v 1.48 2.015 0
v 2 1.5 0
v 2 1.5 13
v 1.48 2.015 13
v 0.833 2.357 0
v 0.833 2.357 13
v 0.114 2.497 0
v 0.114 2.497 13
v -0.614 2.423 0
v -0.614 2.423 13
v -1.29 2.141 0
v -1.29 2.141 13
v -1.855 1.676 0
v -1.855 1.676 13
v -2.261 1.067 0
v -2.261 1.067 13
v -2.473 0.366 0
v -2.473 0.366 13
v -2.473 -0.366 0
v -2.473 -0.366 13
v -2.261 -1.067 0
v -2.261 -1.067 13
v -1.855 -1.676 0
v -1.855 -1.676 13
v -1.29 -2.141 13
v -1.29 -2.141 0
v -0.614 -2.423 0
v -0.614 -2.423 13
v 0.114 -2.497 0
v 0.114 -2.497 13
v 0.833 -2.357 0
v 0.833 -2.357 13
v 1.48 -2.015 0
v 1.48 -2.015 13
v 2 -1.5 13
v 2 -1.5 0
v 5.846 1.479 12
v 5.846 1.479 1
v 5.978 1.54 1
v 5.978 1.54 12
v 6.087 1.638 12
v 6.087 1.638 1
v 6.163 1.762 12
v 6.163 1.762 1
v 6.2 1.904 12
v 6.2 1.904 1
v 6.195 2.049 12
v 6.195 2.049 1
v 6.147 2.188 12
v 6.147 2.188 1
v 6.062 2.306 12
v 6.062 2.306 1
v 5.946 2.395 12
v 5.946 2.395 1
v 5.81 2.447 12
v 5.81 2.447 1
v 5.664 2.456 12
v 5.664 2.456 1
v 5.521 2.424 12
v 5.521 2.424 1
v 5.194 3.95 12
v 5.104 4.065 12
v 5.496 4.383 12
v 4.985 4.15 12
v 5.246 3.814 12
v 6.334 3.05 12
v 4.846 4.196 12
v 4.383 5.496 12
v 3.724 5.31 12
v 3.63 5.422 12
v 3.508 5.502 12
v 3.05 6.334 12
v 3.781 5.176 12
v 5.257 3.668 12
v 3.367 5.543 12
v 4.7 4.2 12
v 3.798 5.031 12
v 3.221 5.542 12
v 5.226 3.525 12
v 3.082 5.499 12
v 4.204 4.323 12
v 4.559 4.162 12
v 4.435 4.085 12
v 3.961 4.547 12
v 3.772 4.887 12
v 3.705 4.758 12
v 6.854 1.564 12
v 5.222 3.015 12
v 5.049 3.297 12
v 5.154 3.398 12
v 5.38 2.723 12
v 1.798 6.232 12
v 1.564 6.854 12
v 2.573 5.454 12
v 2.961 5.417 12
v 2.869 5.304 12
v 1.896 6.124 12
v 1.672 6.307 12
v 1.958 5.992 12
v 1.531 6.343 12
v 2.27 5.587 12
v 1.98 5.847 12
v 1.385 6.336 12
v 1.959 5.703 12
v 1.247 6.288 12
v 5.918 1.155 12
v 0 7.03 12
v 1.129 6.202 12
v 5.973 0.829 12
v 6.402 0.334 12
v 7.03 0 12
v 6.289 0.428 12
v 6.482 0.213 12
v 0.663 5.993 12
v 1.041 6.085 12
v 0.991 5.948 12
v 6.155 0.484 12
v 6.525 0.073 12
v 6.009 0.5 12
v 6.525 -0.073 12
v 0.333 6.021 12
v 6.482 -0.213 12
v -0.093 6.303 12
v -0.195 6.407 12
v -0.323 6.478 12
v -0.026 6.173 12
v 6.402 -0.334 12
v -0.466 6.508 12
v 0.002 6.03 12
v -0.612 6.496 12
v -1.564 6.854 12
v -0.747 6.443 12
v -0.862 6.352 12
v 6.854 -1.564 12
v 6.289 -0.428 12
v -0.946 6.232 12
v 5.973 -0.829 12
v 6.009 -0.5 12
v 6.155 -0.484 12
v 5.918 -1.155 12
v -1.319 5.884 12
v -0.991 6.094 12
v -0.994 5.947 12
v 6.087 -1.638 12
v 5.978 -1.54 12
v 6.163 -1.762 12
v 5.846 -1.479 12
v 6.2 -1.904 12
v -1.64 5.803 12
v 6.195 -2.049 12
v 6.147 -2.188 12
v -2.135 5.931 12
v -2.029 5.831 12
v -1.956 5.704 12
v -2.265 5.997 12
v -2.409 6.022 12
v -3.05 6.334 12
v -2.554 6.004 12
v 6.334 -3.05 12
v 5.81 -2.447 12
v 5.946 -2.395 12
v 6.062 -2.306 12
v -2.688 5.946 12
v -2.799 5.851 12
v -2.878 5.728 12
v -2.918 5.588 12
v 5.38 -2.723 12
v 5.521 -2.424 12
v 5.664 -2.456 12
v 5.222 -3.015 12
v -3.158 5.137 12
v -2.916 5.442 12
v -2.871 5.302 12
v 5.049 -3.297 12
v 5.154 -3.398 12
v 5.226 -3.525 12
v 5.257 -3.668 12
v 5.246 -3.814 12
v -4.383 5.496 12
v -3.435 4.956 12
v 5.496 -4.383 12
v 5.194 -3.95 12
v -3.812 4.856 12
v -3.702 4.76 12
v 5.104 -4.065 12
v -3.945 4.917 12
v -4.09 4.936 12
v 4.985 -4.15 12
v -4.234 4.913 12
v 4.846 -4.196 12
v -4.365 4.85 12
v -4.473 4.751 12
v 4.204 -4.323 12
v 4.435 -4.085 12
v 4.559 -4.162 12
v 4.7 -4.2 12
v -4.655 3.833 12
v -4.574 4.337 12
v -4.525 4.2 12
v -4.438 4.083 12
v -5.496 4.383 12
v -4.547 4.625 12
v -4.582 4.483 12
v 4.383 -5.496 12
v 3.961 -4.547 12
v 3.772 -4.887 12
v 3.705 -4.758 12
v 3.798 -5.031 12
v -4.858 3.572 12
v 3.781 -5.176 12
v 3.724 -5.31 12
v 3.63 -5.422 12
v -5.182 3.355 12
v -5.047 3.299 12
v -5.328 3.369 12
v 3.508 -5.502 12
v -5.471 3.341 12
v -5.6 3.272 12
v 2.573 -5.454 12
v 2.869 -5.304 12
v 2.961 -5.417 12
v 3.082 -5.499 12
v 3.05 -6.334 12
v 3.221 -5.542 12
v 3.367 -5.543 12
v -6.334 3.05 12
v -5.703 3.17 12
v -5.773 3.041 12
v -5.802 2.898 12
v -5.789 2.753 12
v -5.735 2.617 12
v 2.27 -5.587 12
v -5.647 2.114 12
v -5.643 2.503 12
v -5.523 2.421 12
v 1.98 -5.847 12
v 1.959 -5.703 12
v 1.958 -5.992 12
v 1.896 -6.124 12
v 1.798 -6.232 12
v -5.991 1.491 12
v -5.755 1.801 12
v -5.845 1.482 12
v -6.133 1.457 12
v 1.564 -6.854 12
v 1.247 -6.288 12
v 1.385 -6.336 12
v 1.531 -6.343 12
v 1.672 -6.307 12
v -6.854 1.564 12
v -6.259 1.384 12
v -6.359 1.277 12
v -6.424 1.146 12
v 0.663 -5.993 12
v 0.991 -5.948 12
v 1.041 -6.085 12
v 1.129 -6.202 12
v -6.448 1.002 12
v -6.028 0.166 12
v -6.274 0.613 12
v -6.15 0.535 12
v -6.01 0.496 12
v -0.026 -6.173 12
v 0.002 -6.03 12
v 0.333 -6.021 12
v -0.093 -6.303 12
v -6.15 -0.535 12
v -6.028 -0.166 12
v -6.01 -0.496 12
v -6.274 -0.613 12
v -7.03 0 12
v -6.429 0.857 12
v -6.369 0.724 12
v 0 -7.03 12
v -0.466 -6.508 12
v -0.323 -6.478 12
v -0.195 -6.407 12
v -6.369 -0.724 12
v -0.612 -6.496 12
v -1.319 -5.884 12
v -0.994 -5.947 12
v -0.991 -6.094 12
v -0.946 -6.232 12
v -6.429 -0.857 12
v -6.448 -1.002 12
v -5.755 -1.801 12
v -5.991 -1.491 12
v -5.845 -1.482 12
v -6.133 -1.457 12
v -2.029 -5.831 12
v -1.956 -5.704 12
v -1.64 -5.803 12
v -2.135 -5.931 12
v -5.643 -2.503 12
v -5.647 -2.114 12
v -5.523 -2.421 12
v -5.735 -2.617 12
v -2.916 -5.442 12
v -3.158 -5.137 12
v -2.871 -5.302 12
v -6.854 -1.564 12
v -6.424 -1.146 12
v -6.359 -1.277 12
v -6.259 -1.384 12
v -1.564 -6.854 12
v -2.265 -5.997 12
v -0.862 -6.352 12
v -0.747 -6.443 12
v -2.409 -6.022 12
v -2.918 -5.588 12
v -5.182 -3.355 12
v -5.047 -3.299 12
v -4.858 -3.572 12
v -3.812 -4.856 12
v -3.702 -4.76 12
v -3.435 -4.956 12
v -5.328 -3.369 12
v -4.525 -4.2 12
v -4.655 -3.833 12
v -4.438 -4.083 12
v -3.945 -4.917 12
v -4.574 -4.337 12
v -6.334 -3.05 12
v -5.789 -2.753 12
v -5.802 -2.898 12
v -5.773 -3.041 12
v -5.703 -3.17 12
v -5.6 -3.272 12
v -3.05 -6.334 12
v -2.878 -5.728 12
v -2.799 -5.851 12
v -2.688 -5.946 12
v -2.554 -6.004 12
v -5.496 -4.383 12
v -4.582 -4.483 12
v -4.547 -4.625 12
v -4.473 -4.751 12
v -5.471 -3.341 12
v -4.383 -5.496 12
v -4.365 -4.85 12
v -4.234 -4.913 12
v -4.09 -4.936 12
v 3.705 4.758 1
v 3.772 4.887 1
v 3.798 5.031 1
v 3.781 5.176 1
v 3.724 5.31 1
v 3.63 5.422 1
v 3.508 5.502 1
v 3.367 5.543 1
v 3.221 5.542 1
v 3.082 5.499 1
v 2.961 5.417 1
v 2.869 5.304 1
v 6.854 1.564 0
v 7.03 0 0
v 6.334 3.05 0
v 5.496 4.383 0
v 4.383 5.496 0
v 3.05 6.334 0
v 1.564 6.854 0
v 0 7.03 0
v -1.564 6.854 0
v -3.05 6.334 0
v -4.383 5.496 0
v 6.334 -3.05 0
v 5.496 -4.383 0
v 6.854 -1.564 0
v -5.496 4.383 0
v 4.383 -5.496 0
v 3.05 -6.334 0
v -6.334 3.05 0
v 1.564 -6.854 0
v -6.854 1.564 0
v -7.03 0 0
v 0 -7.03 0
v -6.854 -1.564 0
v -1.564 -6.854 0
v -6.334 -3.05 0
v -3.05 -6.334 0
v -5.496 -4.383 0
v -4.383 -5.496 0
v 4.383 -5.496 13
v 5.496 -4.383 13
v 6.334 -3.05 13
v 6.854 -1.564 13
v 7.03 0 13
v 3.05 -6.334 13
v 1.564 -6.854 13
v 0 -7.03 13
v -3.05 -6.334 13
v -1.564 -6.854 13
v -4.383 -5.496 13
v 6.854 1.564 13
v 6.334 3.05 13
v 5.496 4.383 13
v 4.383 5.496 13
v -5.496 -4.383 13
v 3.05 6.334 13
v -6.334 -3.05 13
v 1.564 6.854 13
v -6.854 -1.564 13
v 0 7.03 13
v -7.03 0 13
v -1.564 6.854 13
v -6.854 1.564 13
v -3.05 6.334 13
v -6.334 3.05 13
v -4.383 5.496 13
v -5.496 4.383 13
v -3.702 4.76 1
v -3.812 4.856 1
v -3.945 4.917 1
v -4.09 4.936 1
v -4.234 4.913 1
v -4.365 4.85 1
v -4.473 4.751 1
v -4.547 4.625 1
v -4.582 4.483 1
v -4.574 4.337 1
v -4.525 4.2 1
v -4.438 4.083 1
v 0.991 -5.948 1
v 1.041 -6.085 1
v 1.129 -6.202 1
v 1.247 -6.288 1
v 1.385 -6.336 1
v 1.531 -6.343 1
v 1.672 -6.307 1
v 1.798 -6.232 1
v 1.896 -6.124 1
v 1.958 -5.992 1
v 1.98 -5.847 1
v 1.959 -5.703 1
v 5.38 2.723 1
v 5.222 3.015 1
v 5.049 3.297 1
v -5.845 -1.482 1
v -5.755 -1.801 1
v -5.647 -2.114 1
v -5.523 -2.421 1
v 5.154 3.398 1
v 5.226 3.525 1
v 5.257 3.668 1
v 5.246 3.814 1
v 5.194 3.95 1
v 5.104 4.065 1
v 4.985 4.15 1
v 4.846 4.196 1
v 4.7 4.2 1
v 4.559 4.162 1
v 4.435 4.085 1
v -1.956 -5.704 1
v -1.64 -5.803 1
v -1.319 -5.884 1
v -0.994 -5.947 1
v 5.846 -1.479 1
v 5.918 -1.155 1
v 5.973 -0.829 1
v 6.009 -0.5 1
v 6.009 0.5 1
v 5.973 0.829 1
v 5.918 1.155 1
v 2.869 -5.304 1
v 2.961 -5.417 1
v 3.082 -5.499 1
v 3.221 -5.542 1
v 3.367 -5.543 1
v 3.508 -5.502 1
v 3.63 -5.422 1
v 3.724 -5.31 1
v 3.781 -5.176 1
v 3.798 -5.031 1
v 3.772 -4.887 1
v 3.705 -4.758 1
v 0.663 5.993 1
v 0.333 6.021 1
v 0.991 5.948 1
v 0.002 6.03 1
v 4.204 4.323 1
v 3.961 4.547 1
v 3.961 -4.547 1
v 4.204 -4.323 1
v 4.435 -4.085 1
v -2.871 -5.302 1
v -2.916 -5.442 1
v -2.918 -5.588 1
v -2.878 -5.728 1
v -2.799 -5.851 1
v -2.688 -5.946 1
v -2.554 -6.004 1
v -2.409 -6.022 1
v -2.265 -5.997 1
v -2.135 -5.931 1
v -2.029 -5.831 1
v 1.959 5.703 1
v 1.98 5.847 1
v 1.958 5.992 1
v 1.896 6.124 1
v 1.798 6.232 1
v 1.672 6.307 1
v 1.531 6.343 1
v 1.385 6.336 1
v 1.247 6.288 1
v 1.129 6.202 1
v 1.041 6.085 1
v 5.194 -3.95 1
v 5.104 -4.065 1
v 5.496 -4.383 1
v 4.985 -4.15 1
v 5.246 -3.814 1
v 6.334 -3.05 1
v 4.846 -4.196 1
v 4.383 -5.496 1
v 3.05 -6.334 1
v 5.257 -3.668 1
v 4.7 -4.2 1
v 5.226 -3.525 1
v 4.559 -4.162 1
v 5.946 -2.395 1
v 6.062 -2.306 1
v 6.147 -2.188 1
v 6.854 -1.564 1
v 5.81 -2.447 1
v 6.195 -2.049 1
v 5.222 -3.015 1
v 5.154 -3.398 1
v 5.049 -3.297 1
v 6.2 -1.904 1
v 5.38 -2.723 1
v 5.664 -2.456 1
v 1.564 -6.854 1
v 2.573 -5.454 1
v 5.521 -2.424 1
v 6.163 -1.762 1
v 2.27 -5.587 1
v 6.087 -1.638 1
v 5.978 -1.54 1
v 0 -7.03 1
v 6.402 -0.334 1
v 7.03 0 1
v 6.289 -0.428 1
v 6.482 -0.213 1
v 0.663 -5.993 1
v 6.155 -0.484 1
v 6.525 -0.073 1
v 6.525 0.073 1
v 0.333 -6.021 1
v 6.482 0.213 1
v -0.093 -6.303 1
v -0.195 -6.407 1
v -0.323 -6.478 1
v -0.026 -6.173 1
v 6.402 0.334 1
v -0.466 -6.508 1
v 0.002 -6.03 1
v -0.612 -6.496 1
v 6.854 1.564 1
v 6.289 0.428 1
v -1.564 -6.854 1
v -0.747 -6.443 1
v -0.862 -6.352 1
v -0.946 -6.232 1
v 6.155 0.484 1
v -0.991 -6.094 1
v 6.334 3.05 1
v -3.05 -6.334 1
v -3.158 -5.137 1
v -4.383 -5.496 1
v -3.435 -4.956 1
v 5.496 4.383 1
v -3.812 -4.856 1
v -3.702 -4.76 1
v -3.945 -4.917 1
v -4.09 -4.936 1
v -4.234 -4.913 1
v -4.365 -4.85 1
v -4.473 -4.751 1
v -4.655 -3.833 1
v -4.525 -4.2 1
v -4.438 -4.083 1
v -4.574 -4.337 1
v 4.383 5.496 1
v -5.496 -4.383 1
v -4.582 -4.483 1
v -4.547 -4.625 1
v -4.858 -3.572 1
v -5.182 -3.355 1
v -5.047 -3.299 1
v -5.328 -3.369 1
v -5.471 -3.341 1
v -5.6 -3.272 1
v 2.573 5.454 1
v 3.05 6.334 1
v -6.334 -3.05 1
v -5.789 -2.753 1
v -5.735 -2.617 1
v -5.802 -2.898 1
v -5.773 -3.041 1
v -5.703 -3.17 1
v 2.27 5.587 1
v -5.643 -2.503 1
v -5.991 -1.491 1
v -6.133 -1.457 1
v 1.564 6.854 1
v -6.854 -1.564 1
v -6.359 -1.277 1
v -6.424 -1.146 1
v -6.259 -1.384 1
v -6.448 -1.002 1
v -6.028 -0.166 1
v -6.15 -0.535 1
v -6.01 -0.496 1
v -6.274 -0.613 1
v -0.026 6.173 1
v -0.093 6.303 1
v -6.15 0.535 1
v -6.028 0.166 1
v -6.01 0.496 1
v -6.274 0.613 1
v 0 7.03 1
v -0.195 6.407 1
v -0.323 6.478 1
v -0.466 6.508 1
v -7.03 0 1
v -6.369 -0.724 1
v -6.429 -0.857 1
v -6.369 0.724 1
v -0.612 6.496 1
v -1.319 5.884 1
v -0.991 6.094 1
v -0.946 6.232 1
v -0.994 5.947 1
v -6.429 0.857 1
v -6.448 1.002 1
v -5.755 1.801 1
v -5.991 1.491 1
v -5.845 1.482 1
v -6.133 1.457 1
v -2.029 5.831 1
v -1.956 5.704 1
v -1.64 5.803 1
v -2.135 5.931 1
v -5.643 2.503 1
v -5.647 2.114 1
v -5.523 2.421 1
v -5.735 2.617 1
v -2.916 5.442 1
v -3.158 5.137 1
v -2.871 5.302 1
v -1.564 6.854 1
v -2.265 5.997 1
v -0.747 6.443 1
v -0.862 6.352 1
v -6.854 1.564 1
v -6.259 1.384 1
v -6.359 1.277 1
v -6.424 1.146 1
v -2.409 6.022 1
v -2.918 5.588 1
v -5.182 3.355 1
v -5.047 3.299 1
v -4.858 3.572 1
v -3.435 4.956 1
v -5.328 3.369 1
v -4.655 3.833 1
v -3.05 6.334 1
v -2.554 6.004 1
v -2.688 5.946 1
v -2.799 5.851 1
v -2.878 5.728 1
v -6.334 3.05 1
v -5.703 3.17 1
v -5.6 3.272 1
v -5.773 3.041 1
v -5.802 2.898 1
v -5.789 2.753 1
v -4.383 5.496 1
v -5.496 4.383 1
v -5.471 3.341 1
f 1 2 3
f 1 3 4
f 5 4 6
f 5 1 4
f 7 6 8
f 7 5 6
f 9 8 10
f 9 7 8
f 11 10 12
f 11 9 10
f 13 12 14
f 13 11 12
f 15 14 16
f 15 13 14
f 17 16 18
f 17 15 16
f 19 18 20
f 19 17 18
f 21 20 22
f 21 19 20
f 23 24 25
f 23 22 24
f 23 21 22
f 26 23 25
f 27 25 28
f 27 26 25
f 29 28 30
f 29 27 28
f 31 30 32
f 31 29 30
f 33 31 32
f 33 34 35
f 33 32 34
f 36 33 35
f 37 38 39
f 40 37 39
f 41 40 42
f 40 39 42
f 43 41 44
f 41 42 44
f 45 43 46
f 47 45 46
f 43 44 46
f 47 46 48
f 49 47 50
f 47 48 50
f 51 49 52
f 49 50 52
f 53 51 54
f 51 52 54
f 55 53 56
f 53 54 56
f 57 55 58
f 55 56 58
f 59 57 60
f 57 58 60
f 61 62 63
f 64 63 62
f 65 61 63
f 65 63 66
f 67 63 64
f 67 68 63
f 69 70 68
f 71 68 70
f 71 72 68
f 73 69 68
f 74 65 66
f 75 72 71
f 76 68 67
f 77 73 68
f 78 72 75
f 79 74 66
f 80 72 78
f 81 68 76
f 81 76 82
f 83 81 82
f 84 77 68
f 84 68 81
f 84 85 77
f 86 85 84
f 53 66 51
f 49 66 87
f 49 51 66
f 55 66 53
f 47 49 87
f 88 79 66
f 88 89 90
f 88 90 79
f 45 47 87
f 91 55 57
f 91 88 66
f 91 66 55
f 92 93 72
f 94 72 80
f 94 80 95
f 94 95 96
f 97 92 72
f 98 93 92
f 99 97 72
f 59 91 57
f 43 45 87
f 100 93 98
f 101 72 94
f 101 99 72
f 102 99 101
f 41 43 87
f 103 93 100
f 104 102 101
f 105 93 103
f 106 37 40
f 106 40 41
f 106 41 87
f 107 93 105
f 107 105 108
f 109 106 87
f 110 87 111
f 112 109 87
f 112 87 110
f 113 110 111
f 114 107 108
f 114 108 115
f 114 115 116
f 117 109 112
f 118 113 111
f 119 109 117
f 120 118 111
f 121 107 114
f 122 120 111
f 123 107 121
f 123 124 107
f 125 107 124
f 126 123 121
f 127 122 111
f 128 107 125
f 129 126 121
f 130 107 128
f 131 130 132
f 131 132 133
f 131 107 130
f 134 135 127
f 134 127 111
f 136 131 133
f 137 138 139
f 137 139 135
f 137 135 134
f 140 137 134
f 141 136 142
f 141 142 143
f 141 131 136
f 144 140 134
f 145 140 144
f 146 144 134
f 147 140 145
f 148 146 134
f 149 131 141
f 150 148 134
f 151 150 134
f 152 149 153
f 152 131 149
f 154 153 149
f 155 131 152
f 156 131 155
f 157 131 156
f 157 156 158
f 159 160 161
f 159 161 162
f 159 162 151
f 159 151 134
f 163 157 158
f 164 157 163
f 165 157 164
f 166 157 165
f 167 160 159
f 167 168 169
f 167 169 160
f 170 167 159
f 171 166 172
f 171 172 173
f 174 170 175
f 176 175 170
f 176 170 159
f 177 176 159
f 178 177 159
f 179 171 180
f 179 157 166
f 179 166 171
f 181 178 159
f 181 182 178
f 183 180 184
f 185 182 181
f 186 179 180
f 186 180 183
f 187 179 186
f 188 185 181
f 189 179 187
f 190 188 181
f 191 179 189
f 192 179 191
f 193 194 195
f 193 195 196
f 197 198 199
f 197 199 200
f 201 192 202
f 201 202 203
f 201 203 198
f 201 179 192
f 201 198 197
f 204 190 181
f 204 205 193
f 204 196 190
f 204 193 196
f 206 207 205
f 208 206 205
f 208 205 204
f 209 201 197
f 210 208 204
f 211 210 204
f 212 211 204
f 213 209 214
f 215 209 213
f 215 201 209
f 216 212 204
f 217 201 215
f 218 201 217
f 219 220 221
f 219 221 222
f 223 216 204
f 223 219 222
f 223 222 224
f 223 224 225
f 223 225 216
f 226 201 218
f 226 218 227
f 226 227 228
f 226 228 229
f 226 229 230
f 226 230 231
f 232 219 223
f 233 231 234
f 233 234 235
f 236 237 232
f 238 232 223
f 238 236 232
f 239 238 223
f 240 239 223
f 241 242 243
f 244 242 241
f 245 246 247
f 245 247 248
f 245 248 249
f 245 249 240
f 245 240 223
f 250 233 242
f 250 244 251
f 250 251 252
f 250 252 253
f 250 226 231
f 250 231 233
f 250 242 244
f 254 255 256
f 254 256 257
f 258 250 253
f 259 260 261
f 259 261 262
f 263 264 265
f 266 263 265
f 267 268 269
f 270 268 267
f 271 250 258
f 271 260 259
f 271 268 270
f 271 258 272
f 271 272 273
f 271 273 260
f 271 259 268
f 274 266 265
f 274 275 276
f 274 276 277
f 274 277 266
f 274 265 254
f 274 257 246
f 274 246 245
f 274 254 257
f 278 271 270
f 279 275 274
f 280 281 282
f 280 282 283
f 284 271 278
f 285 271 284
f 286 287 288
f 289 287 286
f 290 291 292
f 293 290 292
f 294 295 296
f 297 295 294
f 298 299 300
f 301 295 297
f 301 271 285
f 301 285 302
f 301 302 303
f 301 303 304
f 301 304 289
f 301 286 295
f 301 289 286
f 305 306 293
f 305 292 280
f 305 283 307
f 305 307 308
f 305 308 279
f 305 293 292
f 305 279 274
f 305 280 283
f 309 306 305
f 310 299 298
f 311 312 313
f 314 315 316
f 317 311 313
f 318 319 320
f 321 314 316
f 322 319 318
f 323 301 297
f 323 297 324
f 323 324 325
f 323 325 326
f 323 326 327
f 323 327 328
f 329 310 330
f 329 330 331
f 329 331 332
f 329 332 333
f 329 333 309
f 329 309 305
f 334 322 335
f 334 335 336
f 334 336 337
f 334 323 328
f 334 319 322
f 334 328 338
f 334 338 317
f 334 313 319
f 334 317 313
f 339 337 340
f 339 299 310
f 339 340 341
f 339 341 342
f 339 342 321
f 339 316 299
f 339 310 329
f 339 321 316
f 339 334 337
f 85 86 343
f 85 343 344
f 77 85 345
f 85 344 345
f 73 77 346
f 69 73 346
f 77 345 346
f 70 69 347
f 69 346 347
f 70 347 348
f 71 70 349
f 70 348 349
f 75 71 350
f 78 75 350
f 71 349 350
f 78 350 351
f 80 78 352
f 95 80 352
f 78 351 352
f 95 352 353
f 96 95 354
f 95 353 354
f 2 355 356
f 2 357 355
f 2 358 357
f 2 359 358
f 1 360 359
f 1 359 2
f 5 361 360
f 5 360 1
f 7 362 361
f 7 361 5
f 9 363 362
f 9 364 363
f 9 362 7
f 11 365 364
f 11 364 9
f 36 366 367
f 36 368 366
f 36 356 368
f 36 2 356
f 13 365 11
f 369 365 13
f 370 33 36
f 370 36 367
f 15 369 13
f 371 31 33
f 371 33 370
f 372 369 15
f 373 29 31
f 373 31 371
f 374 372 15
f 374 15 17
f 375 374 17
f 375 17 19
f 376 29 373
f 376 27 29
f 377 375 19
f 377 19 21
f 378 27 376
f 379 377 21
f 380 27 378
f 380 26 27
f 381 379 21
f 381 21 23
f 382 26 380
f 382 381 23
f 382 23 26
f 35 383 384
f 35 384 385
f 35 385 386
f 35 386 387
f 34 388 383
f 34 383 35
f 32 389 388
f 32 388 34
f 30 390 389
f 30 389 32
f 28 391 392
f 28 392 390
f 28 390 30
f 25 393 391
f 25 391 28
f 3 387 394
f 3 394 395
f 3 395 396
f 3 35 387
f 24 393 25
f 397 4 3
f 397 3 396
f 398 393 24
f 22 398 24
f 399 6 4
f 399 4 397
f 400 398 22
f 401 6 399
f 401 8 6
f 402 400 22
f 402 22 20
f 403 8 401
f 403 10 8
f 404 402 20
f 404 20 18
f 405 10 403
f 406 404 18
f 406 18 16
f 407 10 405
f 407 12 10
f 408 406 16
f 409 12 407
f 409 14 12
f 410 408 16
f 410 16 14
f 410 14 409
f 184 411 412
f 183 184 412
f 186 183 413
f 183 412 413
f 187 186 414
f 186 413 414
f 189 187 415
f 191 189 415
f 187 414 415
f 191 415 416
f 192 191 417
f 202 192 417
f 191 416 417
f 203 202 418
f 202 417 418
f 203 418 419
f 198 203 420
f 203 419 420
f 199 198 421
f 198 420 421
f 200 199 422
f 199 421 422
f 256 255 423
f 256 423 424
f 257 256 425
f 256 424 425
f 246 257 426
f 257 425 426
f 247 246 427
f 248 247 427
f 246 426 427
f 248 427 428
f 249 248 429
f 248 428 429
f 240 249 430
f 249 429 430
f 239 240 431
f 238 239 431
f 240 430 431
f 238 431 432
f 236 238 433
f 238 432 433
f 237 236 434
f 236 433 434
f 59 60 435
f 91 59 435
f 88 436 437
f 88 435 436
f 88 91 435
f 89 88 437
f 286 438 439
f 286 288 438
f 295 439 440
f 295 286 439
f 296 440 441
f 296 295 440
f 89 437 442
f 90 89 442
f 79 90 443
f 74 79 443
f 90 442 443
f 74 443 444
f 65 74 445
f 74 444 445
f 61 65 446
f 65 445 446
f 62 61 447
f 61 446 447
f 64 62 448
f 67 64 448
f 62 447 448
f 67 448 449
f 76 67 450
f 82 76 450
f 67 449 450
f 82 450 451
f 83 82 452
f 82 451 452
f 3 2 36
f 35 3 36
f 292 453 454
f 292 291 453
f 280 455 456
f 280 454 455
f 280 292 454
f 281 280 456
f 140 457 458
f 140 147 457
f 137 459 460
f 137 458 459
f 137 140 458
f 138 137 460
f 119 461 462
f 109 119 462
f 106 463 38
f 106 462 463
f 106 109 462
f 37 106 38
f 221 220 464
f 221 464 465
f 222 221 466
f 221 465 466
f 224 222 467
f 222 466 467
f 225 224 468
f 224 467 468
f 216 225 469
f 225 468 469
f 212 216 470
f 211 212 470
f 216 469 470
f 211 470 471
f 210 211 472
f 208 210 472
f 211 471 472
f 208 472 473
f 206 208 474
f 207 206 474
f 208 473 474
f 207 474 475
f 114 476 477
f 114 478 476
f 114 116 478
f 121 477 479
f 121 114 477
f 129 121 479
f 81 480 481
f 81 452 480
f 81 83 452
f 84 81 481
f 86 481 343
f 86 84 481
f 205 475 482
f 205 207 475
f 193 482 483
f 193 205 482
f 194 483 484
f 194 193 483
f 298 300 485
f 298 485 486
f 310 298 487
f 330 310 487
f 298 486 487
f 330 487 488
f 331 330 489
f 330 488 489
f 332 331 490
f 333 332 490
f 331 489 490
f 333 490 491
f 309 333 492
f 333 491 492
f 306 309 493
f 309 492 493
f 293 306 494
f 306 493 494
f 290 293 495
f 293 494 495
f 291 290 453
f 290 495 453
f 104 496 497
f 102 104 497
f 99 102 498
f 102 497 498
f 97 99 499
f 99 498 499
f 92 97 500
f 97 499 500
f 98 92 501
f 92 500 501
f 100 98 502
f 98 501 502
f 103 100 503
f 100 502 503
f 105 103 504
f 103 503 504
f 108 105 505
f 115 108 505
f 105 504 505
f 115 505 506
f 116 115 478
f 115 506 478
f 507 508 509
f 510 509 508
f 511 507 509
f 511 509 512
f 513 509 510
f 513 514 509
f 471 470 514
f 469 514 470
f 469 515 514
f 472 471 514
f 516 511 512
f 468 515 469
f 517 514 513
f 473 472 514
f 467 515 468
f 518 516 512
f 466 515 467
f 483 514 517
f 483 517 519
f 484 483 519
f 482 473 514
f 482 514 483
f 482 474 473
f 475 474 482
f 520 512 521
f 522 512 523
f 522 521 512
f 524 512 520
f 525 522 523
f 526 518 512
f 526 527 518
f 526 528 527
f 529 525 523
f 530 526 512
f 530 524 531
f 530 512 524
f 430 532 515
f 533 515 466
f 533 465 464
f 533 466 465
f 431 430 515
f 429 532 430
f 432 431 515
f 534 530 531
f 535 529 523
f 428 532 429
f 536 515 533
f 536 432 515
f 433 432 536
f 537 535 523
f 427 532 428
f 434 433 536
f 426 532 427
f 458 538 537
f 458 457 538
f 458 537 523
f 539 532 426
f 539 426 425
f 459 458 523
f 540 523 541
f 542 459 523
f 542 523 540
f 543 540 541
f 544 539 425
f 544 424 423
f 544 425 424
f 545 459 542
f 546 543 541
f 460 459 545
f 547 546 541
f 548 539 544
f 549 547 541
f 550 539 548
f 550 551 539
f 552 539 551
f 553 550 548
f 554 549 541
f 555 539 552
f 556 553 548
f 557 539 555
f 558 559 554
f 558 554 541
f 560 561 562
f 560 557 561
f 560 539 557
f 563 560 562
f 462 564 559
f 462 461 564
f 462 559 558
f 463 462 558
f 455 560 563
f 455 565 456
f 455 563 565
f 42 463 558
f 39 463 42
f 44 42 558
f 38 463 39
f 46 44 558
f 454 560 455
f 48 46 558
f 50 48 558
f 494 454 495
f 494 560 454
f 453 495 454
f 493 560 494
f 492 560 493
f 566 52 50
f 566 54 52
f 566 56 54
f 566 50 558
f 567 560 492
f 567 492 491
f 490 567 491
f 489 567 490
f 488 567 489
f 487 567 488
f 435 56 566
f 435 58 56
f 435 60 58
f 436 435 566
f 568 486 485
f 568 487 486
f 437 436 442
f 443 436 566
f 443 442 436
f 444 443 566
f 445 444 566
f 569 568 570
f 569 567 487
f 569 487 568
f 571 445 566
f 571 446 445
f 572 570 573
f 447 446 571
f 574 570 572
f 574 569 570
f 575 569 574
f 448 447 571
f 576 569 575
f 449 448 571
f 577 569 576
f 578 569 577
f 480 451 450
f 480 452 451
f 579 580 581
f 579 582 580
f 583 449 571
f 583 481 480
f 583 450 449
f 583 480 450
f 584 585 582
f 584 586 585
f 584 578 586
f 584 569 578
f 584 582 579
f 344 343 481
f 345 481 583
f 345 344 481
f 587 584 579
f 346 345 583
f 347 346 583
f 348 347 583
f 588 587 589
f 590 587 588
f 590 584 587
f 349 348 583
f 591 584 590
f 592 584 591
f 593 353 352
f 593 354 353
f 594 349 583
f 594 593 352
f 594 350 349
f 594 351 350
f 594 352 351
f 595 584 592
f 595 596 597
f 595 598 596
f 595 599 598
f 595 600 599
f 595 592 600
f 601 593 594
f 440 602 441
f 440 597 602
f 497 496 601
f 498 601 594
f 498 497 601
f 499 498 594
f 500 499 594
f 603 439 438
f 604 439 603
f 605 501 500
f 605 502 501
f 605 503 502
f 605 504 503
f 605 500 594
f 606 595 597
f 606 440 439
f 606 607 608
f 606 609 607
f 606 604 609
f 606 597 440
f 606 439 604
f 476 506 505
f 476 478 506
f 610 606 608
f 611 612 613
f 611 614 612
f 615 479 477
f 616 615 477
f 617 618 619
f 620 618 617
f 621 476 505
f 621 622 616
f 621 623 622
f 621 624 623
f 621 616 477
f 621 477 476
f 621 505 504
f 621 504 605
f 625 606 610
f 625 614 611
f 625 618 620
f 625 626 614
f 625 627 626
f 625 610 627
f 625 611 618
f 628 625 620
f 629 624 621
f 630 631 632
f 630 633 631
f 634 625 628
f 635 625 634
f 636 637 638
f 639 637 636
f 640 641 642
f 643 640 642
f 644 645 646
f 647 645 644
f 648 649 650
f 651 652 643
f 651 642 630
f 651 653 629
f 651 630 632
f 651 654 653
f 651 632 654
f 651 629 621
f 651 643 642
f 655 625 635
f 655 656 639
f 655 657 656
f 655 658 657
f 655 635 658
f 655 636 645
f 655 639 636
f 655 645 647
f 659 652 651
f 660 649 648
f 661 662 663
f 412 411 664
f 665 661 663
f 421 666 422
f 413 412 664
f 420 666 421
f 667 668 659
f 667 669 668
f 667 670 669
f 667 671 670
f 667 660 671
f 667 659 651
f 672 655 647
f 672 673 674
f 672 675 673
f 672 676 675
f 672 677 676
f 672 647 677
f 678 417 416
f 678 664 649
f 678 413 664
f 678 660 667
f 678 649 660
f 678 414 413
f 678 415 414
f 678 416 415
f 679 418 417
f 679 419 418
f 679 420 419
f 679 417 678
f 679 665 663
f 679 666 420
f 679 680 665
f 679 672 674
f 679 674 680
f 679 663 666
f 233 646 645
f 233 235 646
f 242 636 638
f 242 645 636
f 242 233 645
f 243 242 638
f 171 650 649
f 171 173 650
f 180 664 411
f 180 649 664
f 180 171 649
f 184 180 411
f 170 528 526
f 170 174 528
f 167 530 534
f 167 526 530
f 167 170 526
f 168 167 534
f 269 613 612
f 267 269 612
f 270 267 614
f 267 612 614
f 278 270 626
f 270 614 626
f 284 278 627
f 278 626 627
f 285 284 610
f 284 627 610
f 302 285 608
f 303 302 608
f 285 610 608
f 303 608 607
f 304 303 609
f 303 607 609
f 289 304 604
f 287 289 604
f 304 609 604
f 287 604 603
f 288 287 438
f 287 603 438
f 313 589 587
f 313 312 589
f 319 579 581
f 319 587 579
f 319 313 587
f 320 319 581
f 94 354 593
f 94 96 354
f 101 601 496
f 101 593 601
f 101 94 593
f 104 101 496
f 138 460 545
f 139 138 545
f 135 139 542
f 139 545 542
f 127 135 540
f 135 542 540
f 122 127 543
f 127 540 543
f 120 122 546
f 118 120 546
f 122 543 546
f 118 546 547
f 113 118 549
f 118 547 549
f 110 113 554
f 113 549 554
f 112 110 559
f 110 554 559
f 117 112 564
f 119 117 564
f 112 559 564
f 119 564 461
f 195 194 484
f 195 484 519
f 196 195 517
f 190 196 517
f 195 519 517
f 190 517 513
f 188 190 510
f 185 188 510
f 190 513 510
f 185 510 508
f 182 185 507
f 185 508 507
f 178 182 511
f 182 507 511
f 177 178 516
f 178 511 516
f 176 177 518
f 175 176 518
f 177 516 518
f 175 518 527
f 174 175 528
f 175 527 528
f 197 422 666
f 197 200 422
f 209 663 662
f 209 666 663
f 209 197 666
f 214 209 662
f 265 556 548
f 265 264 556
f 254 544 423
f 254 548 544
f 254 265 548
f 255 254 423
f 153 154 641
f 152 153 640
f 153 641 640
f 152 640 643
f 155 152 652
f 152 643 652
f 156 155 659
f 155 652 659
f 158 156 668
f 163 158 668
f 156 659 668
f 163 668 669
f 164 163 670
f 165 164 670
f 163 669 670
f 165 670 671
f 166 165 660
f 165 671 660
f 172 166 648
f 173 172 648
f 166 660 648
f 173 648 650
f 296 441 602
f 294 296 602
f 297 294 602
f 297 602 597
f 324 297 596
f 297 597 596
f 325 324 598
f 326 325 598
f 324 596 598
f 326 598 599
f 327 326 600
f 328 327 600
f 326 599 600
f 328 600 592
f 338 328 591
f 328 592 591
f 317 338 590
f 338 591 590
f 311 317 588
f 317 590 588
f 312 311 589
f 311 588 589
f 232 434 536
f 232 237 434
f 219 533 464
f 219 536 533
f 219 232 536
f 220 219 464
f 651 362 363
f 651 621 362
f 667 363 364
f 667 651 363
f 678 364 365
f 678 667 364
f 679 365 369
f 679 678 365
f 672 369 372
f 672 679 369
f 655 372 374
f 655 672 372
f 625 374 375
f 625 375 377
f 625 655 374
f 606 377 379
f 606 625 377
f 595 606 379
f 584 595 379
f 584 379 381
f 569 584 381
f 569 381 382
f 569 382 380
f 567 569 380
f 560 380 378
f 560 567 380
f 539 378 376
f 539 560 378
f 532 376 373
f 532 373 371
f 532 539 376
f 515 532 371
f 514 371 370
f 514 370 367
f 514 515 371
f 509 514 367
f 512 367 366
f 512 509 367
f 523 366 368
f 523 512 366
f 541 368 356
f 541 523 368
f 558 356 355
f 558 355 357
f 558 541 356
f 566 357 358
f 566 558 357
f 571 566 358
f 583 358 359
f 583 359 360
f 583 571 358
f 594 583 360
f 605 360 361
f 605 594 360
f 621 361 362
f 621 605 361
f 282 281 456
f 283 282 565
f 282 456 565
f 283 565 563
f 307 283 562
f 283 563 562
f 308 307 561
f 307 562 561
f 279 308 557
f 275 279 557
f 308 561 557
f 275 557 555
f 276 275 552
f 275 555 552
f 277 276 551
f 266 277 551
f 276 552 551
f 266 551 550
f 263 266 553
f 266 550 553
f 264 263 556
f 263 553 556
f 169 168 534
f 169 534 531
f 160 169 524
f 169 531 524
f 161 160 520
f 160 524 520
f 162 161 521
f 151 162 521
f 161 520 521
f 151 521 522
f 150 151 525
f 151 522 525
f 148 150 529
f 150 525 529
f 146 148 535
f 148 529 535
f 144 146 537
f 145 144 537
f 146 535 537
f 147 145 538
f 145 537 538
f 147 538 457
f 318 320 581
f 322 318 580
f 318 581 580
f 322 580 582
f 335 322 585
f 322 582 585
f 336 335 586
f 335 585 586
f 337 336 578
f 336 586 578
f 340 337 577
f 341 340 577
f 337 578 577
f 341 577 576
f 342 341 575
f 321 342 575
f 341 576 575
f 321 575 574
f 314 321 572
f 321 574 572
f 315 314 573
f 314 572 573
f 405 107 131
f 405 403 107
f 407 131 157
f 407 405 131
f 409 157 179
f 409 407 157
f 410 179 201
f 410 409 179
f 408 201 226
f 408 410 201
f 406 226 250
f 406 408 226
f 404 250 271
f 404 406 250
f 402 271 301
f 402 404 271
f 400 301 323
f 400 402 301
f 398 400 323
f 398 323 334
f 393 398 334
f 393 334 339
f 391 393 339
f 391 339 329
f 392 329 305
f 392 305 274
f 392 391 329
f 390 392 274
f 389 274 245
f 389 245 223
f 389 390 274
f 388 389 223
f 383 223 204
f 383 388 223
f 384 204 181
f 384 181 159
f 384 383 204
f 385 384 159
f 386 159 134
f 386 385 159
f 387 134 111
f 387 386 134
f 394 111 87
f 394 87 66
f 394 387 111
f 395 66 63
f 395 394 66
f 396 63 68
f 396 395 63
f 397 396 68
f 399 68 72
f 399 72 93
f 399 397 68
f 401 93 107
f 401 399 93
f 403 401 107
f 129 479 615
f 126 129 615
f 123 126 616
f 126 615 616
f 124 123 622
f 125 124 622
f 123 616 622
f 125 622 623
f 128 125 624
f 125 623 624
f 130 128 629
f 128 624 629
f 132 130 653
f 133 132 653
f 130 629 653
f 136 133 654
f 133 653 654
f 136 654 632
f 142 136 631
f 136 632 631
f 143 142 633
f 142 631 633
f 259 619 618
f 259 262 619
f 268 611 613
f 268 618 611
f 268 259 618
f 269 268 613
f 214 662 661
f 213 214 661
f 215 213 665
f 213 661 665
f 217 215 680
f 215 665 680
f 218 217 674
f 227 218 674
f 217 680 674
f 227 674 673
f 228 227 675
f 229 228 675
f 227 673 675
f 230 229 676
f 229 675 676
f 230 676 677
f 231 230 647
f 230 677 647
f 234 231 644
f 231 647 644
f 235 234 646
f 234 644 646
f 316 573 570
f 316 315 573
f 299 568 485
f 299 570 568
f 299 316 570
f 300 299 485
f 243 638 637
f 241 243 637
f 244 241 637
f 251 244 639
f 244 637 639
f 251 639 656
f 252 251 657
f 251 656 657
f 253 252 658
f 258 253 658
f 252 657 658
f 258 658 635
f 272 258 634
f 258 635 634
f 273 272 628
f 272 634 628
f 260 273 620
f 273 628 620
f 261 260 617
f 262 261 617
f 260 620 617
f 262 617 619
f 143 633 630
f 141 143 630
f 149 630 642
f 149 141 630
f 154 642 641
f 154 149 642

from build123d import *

# Parameters (mm, degrees)
PAD033_DEPTH          = 11
POLARPATTERN002_COUNT = 19
PAD034_DEPTH          = 13


with BuildPart() as part:
    # Sketch066 → Revolution003 (revolve)
    with BuildSketch(Plane.YZ):
        Polygon((2.5, 0), (7.03, 0), (7.03, 1), (6.03, 1), (6.03, 12), (7.03, 12), (7.03, 13), (2.5, 13), align=None)
    revolve(axis=Axis((0, 0, 0), (0, 0, 1)))

    # Sketch065 → Pad033 (new body)
    with BuildSketch(Plane.XY.offset(1)):
        with BuildLine():
            ThreePointArc((5.78, -0.433013), (6.53, 0), (5.78, 0.433013))
            Line((5.78, 0.433013), (5.78, -0.433013))
        make_face()
    pad033 = extrude(amount=PAD033_DEPTH)

    # PolarPattern002: Pad033 ×19 about axis
    polarpattern002_axis = Axis((0, 0, 1), (0, 0, 1))
    for i in range(1, POLARPATTERN002_COUNT):
        add(pad033.rotate(polarpattern002_axis, i * 360 / POLARPATTERN002_COUNT))

    # Sketch067 → Pad034 (join)
    with BuildSketch(Plane.XY):
        with BuildLine():
            ThreePointArc((2, -1.5), (2.5, 0), (2, 1.5))
            Line((2, 1.5), (2, -1.5))
        make_face()
    extrude(amount=PAD034_DEPTH)


solid = part.part
